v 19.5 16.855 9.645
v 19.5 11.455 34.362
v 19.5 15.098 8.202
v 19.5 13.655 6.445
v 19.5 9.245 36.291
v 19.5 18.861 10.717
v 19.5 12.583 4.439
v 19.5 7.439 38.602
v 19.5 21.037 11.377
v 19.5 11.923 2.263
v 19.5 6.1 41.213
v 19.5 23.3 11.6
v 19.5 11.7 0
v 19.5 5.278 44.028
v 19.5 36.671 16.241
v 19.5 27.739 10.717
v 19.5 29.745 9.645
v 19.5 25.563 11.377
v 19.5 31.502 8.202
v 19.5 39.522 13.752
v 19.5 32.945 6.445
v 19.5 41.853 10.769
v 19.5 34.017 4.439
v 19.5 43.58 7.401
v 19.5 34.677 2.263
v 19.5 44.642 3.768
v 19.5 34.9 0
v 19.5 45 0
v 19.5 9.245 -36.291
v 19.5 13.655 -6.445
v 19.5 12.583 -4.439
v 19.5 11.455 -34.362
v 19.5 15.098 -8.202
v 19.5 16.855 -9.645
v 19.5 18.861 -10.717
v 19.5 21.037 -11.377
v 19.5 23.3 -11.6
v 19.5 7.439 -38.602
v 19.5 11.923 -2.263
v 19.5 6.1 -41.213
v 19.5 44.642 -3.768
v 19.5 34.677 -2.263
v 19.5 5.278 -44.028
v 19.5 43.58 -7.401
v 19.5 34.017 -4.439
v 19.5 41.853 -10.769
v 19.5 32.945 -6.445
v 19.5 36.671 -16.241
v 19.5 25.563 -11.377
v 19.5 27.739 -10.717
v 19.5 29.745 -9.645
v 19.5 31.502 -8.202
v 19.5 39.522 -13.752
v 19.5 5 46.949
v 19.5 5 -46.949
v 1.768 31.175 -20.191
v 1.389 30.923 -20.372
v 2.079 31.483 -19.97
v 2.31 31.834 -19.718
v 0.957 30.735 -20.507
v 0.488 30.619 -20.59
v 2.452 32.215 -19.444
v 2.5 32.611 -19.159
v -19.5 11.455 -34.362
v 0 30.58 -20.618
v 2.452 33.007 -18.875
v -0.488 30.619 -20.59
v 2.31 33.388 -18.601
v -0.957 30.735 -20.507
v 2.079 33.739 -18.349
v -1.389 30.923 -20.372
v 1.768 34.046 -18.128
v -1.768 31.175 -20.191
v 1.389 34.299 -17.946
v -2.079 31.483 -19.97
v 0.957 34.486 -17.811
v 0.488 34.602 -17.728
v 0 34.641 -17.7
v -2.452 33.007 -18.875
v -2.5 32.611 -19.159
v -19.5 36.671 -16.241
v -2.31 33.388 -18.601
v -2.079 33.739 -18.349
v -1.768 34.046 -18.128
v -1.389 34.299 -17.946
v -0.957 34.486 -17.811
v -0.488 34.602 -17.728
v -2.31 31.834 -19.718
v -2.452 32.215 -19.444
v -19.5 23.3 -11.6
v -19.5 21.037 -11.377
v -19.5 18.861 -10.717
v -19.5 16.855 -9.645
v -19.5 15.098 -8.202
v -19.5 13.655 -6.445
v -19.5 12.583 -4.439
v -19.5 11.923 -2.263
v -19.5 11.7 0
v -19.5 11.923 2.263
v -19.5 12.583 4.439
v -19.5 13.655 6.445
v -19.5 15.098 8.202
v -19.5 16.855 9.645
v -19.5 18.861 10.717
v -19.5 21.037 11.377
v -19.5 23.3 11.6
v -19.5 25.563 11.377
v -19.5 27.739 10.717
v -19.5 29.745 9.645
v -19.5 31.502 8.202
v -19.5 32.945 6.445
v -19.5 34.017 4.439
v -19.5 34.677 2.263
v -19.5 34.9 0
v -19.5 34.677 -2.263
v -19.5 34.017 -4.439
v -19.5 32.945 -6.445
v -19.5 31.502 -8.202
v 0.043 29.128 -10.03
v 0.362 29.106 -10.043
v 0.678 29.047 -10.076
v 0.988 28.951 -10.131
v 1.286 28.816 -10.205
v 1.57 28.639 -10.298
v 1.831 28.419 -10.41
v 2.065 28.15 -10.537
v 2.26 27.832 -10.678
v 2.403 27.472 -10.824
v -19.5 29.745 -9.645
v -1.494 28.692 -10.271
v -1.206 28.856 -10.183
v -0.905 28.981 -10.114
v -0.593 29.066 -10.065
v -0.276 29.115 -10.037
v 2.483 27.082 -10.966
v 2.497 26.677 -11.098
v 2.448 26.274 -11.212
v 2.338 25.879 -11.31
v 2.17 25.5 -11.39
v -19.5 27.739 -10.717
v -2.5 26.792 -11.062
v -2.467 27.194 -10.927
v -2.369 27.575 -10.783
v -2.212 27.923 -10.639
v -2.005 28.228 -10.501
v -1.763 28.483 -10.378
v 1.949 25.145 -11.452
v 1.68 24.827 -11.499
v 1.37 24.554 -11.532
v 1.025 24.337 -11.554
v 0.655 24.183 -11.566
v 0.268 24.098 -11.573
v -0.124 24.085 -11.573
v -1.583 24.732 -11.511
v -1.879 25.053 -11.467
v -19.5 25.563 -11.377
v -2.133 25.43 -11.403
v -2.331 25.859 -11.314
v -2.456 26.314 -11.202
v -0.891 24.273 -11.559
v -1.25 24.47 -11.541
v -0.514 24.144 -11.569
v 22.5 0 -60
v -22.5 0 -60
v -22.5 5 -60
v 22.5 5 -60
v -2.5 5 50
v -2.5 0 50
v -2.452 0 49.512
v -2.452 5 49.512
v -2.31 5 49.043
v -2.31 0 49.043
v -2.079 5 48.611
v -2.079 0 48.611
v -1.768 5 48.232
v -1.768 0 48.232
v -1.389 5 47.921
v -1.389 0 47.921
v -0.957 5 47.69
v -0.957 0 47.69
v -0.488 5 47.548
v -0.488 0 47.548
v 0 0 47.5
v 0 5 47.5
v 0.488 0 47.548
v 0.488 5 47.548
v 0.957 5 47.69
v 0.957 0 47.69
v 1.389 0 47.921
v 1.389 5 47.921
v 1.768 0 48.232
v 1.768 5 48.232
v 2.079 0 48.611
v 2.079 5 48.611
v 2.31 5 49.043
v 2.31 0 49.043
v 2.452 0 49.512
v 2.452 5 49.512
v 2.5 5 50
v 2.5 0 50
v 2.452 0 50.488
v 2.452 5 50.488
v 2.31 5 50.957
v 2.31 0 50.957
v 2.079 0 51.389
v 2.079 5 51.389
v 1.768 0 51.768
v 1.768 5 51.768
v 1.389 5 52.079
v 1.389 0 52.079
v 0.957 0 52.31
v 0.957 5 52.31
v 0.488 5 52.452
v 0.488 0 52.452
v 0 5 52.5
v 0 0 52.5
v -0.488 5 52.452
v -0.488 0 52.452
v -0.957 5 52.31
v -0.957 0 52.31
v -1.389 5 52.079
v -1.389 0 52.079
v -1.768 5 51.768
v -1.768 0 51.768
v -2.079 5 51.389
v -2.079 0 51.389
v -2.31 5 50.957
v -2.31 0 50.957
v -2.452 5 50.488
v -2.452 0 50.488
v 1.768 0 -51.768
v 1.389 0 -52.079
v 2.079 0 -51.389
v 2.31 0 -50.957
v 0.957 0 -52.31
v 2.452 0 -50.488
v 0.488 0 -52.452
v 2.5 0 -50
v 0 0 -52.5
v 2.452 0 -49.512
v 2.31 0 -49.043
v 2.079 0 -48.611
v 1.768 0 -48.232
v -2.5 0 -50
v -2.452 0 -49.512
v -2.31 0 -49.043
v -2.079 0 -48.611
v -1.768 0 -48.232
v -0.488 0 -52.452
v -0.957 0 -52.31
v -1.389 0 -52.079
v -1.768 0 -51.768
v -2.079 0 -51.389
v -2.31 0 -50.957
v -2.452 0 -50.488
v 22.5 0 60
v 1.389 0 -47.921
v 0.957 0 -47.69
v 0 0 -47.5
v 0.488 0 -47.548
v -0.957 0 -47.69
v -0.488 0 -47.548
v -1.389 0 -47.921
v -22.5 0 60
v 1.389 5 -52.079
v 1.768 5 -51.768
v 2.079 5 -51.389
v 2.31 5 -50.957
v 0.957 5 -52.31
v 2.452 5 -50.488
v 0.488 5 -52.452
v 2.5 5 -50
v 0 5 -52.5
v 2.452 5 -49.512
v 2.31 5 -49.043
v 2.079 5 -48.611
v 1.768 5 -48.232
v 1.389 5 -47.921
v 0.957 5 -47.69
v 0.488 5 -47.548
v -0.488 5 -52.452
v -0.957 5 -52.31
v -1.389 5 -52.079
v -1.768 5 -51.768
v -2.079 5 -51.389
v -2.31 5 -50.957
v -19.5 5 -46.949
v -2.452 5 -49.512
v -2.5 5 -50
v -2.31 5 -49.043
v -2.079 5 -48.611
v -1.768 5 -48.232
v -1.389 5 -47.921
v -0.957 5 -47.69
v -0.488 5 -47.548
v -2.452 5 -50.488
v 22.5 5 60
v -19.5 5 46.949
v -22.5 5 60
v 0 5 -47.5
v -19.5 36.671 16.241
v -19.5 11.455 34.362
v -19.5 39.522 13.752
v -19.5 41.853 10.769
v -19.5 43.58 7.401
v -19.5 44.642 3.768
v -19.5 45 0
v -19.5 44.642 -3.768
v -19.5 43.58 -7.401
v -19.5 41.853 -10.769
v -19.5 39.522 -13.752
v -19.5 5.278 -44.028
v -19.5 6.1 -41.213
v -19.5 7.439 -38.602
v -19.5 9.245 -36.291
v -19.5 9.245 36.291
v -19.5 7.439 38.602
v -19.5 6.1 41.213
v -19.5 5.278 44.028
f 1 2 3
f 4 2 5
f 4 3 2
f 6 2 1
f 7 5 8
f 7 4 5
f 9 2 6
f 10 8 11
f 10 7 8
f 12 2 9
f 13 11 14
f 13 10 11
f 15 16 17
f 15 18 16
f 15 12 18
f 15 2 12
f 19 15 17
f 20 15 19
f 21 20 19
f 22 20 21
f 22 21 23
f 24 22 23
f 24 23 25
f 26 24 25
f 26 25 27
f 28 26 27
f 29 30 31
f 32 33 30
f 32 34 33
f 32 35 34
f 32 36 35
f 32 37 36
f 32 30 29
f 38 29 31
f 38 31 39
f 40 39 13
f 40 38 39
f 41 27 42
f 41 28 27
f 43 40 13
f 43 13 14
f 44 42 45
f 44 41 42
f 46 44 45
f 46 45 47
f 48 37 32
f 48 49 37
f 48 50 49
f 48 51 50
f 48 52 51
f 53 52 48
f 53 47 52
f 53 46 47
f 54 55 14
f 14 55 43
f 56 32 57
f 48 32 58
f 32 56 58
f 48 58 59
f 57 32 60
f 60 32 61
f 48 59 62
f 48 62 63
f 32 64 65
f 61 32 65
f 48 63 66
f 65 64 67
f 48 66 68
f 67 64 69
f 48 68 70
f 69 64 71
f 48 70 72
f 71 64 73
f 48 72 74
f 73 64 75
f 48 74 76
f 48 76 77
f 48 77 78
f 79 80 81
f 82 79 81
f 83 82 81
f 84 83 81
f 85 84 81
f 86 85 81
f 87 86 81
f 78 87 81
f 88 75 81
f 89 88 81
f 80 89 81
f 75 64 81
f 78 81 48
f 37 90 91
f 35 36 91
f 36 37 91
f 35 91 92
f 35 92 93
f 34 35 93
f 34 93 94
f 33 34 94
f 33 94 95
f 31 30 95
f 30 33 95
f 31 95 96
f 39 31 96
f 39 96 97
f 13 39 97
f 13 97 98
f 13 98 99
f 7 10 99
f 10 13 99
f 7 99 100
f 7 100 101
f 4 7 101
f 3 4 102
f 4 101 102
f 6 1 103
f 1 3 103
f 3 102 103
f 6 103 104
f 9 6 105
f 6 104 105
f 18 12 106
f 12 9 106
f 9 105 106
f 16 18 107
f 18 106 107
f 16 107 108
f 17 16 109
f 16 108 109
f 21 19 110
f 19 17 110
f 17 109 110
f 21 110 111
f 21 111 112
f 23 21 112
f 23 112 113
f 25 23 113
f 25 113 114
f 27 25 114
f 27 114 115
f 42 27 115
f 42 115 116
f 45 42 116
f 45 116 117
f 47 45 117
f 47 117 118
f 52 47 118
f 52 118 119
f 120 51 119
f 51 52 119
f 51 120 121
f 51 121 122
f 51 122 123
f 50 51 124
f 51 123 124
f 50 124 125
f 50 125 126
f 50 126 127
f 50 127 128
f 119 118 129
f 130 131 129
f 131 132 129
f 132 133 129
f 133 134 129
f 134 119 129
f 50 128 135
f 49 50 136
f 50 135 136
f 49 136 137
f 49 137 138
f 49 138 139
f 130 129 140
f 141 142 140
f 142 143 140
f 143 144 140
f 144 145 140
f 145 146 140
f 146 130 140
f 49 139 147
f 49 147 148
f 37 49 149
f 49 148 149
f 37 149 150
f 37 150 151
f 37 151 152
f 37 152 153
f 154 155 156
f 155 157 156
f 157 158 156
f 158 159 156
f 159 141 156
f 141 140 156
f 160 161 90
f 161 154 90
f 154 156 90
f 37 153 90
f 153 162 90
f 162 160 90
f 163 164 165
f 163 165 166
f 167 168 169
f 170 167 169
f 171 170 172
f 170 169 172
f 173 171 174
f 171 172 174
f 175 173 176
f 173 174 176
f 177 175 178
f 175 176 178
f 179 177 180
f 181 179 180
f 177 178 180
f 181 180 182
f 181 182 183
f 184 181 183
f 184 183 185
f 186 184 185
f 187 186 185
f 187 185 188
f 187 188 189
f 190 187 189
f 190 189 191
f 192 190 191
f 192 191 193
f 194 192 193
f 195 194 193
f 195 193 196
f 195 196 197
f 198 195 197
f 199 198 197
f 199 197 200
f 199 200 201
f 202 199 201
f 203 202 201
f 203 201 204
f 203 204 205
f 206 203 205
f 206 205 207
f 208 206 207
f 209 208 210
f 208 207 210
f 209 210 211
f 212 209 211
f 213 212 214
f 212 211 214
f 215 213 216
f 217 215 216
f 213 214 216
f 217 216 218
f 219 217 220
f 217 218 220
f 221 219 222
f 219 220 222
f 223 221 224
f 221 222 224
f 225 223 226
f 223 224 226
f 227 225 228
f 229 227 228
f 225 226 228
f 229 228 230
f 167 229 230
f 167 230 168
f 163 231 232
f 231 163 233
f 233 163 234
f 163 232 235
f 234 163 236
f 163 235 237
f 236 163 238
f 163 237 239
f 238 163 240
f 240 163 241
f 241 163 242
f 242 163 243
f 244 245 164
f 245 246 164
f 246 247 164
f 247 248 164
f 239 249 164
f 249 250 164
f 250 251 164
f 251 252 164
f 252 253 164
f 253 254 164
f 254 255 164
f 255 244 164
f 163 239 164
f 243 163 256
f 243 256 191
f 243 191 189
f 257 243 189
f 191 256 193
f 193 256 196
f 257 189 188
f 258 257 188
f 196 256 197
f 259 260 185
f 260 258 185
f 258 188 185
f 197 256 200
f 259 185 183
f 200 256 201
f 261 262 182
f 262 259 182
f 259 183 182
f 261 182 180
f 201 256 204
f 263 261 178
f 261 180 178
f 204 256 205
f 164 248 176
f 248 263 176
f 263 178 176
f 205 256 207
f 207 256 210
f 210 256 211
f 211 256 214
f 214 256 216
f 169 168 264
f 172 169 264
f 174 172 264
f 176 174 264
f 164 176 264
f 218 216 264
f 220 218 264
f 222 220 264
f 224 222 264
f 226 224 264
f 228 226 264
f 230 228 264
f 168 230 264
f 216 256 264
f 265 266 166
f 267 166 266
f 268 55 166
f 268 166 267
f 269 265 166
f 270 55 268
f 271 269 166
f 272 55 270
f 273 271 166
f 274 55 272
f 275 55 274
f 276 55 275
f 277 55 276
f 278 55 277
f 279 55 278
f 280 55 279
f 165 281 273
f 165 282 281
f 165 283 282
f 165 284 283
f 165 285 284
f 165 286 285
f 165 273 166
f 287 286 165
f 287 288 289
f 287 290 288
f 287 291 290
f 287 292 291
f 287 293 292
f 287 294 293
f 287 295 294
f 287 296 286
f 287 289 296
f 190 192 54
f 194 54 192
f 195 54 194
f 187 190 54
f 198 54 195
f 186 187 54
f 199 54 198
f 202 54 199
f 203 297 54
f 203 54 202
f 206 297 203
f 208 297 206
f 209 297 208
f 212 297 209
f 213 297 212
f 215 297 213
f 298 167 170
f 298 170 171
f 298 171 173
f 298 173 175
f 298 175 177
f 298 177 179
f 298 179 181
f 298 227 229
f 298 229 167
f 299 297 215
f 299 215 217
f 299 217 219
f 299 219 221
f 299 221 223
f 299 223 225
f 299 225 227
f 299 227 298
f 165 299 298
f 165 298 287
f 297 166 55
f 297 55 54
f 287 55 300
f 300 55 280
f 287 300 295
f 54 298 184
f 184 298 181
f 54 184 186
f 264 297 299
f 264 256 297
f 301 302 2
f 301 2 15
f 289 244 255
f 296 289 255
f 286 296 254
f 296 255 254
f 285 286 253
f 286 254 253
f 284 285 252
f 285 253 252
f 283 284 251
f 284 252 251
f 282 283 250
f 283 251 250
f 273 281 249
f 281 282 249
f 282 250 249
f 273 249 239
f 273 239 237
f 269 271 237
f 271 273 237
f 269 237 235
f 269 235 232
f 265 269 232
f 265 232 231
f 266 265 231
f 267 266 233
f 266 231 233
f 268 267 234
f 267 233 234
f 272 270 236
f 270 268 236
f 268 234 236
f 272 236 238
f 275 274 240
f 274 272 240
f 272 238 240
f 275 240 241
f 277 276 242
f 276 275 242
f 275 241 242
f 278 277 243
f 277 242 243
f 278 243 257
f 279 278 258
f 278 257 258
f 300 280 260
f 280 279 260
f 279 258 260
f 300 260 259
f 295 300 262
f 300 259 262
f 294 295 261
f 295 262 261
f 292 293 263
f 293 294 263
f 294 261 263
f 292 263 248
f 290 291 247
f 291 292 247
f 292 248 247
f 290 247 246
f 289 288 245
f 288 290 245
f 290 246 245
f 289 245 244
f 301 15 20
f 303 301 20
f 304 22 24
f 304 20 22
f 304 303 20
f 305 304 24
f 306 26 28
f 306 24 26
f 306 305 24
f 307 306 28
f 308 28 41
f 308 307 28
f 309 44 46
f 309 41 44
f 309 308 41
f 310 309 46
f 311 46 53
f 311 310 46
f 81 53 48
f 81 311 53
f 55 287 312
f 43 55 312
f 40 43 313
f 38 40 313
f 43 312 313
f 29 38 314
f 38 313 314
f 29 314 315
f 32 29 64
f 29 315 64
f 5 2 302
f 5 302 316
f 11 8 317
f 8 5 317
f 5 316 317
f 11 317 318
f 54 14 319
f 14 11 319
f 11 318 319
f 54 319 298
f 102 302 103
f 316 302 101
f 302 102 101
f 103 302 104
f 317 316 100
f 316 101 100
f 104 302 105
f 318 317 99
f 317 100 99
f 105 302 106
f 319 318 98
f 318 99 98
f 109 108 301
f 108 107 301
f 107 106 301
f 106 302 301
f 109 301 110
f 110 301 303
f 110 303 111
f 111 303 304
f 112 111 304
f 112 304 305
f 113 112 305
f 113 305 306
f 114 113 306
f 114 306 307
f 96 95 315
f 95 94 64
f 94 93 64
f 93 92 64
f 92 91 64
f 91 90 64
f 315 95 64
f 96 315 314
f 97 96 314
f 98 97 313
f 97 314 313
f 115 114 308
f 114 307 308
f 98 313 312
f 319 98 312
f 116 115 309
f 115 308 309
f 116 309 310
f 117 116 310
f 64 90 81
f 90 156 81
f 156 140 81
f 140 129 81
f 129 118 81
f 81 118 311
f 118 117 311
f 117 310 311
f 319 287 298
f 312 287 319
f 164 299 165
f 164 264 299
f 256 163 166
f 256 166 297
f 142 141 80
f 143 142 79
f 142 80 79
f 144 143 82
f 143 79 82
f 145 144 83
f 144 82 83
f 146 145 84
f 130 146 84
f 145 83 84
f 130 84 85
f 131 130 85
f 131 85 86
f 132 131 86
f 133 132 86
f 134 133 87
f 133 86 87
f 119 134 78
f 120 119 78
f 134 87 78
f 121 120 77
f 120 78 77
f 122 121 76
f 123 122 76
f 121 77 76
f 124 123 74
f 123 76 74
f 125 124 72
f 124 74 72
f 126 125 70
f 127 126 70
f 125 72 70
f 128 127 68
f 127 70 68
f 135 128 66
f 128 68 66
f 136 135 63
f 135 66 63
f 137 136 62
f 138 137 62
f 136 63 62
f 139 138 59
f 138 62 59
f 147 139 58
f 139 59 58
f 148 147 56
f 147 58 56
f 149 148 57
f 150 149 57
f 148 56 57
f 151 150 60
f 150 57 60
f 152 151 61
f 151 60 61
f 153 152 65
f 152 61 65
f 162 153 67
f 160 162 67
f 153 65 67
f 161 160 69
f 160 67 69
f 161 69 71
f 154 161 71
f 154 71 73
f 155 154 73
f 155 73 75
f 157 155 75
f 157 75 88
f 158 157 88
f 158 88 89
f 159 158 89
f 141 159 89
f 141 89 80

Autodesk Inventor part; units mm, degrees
ref_plane "YZ Plane" through (0, 0, 0) normal (1, 0, 0) x (0, 1, 0)
ref_plane "XZ Plane" through (0, 0, 0) normal (0, 1, 0) x (-1, 0, 0)
ref_plane "XY Plane" through (0, 0, 0) normal (0, 0, 1) x (1, 0, 0)
sketch "Sketch6" plane through (0, 0, 0) normal (0, 1, 0) x (-1, 0, 0)
  line L0 (22.5, 0) -> (22.5, -60)
  line L1 (22.5, -60) -> (-22.5, -60)
  line L2 (-22.5, -60) -> (-22.5, 0)
  circle A0 centre (0, -50) radius 2.5
  line L3 (-22.5, 0) -> (22.5, 0)
  point P0 (0, 0)
  dimension "d85" = 22.5
  dimension "d86" = 60
  dimension "d87" = 45
  dimension "d89" = 5
extrude "Extrusion3" add sketch "Sketch6" along normal blind 5
mirror "Mirror3" about plane through (-22.5, 0, 0) normal (0, 0, 1) of "Extrusion3"
sketch "Sketch7" plane through (0, 0, -60) normal (1, 0, 0) x (0, 0, -1)
  arc A0 (-43.7585, 36.671) -> (-76.2415, 36.671) centre (-60, 25) ccw
  circle A1 centre (-60, 23.3) radius 11.6
  line L0 (0, 5) -> (-120, 5) projected
  line L1 (-60, 5) -> (-99, 5)
  line L2 (-99, 5) -> (-76.2415, 36.671)
  line L3 (-60, 5) -> (-21, 5)
  line L4 (-21, 5) -> (-43.7585, 36.671)
  line L5 (-21, 5) -> (-99, 5)
  line L6 (-60, 17.6583) -> (-60, 50) construction
  line L7 (-120, 0) -> (0, 0) projected
  point P0 (-60, 0)
  point P1 (-60, 0)
  point P2 (-60, 0)
  dimension "d92" = 40
  dimension "d93" = 23.2
  dimension "d94" = 39
  dimension "d95" = 39
  dimension "d104" = 23.3
  dimension "d105" = 25
extrude "Extrusion6" add sketch "Sketch7" along normal mid plane 39
sketch "Sketch10" plane through (19.5, 0, -60) normal (1, 0, 0) x (0, 0, -1)
  circle A0 centre (-60, 23.3) radius 11.6 construction
  point P0 (-60, 0)
hole "Hole4" at (19.5, 23.3, 0) direction (-1, 0, 0) diameter 22.25 depth 7
sketch "Sketch11" plane through (-19.5, 0, -60) normal (-1, 0, 0) x (0, 0, 1)
  circle A0 centre (60, 23.3) radius 11.6 projected
  point P0 (60, 0)
hole "Hole5" at (-19.5, 23.3, 0) at (-19.5, 23.3, 0) direction (1, 0, 0) diameter 22.3 depth 7
fillet "Fillet1" radius 15.5 2 edges at (0, 5, 39) (0, 5, -39)
sketch "Sketch12" plane through (19.5, 36.671, -16.2415) normal (0, 0.5835502, -0.812077) x (-1, 0, 0)
  circle A0 centre (19.5, -5) radius 2.5
  point P0 (19.5, -20.3019)
  dimension "d121" = 5
extrude "Extrusion7" cut sketch "Sketch12" against normal blind 28.75
properties part number "8P - MainWing Joint"
